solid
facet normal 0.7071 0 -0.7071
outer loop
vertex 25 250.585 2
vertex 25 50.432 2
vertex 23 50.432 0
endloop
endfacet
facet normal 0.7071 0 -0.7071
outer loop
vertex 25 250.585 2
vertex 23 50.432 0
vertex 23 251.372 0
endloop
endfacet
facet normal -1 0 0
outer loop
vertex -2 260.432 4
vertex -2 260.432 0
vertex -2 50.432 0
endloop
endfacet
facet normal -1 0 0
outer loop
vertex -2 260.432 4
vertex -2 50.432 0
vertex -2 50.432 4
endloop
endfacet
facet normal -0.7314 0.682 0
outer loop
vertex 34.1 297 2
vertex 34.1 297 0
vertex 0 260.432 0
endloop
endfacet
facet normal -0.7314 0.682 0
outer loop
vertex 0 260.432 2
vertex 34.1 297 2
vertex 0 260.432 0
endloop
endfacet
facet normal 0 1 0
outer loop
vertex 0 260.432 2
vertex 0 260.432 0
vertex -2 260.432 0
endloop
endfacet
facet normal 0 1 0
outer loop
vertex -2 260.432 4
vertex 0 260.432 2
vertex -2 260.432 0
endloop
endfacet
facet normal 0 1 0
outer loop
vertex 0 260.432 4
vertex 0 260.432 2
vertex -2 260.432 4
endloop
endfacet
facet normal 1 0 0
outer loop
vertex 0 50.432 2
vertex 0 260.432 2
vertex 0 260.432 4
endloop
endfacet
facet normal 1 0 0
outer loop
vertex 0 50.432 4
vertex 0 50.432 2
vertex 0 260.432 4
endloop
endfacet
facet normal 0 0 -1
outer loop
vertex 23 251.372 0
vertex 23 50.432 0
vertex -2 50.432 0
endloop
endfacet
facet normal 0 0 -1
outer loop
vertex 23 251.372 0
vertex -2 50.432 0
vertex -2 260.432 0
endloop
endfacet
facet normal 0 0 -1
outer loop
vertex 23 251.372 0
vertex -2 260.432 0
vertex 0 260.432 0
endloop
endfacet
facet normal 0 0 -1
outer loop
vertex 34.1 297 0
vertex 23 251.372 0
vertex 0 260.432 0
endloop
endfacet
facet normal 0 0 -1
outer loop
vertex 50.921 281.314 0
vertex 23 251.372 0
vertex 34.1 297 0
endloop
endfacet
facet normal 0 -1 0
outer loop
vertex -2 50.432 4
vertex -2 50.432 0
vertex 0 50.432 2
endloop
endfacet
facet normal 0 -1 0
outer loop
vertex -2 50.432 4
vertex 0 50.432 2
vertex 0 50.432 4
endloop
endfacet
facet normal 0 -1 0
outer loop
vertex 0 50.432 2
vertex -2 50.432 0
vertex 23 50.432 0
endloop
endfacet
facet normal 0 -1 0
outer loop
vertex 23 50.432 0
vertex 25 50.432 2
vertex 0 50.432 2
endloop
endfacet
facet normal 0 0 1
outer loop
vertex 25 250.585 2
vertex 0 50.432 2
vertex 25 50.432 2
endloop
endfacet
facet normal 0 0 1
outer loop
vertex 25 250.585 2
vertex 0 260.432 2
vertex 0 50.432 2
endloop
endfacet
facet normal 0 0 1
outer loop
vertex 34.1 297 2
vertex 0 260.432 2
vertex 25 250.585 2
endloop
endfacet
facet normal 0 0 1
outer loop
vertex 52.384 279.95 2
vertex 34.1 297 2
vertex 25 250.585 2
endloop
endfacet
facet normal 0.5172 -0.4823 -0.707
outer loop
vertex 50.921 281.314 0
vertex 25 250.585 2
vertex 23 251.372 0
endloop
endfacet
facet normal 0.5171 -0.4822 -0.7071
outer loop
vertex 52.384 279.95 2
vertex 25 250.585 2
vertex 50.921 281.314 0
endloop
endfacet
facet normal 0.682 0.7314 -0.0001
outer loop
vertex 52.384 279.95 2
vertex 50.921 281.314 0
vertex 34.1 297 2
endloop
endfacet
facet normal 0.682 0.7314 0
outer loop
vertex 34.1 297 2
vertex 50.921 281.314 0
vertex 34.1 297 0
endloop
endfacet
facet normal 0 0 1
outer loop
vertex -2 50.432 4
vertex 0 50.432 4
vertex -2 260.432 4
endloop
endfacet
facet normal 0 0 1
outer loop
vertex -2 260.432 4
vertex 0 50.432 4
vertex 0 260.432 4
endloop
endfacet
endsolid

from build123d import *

# Parameters (mm, degrees)
BOSS_EXTRUDE1_DEPTH = 2
SKETCH4_W           = 4
SKETCH4_H           = 210
BOSS_EXTRUDE2_DEPTH = 2
CHAMFER1_SIZE       = 2


with BuildPart() as part:
    # Sketch3 → Boss-Extrude1 (new body)
    with BuildSketch(Plane.XY):
        Polygon((0, 50.432314919), (25, 50.432314919), (25, 250.584553029), (52.383760544, 279.950040998), (34.099918003, 297), (0, 260.432314919), align=None)
    extrude(amount=BOSS_EXTRUDE1_DEPTH)

    # Sketch4 → Boss-Extrude2 (add)
    with BuildSketch(Plane.ZY):
        with Locations((2, 155.432314919)):
            Rectangle(SKETCH4_W, SKETCH4_H)
    extrude(amount=BOSS_EXTRUDE2_DEPTH)

    # Chamfer1
    chamfer1_edges = [part.edges().sort_by_distance(p)[0] for p in [
        (38.691880272, 265.267297014, 0),
        (25, 150.508433974, 0),
    ]]
    chamfer(chamfer1_edges, length=CHAMFER1_SIZE - 0.0001)  # a hair under: the kernel refuses the full size


solid = part.part
